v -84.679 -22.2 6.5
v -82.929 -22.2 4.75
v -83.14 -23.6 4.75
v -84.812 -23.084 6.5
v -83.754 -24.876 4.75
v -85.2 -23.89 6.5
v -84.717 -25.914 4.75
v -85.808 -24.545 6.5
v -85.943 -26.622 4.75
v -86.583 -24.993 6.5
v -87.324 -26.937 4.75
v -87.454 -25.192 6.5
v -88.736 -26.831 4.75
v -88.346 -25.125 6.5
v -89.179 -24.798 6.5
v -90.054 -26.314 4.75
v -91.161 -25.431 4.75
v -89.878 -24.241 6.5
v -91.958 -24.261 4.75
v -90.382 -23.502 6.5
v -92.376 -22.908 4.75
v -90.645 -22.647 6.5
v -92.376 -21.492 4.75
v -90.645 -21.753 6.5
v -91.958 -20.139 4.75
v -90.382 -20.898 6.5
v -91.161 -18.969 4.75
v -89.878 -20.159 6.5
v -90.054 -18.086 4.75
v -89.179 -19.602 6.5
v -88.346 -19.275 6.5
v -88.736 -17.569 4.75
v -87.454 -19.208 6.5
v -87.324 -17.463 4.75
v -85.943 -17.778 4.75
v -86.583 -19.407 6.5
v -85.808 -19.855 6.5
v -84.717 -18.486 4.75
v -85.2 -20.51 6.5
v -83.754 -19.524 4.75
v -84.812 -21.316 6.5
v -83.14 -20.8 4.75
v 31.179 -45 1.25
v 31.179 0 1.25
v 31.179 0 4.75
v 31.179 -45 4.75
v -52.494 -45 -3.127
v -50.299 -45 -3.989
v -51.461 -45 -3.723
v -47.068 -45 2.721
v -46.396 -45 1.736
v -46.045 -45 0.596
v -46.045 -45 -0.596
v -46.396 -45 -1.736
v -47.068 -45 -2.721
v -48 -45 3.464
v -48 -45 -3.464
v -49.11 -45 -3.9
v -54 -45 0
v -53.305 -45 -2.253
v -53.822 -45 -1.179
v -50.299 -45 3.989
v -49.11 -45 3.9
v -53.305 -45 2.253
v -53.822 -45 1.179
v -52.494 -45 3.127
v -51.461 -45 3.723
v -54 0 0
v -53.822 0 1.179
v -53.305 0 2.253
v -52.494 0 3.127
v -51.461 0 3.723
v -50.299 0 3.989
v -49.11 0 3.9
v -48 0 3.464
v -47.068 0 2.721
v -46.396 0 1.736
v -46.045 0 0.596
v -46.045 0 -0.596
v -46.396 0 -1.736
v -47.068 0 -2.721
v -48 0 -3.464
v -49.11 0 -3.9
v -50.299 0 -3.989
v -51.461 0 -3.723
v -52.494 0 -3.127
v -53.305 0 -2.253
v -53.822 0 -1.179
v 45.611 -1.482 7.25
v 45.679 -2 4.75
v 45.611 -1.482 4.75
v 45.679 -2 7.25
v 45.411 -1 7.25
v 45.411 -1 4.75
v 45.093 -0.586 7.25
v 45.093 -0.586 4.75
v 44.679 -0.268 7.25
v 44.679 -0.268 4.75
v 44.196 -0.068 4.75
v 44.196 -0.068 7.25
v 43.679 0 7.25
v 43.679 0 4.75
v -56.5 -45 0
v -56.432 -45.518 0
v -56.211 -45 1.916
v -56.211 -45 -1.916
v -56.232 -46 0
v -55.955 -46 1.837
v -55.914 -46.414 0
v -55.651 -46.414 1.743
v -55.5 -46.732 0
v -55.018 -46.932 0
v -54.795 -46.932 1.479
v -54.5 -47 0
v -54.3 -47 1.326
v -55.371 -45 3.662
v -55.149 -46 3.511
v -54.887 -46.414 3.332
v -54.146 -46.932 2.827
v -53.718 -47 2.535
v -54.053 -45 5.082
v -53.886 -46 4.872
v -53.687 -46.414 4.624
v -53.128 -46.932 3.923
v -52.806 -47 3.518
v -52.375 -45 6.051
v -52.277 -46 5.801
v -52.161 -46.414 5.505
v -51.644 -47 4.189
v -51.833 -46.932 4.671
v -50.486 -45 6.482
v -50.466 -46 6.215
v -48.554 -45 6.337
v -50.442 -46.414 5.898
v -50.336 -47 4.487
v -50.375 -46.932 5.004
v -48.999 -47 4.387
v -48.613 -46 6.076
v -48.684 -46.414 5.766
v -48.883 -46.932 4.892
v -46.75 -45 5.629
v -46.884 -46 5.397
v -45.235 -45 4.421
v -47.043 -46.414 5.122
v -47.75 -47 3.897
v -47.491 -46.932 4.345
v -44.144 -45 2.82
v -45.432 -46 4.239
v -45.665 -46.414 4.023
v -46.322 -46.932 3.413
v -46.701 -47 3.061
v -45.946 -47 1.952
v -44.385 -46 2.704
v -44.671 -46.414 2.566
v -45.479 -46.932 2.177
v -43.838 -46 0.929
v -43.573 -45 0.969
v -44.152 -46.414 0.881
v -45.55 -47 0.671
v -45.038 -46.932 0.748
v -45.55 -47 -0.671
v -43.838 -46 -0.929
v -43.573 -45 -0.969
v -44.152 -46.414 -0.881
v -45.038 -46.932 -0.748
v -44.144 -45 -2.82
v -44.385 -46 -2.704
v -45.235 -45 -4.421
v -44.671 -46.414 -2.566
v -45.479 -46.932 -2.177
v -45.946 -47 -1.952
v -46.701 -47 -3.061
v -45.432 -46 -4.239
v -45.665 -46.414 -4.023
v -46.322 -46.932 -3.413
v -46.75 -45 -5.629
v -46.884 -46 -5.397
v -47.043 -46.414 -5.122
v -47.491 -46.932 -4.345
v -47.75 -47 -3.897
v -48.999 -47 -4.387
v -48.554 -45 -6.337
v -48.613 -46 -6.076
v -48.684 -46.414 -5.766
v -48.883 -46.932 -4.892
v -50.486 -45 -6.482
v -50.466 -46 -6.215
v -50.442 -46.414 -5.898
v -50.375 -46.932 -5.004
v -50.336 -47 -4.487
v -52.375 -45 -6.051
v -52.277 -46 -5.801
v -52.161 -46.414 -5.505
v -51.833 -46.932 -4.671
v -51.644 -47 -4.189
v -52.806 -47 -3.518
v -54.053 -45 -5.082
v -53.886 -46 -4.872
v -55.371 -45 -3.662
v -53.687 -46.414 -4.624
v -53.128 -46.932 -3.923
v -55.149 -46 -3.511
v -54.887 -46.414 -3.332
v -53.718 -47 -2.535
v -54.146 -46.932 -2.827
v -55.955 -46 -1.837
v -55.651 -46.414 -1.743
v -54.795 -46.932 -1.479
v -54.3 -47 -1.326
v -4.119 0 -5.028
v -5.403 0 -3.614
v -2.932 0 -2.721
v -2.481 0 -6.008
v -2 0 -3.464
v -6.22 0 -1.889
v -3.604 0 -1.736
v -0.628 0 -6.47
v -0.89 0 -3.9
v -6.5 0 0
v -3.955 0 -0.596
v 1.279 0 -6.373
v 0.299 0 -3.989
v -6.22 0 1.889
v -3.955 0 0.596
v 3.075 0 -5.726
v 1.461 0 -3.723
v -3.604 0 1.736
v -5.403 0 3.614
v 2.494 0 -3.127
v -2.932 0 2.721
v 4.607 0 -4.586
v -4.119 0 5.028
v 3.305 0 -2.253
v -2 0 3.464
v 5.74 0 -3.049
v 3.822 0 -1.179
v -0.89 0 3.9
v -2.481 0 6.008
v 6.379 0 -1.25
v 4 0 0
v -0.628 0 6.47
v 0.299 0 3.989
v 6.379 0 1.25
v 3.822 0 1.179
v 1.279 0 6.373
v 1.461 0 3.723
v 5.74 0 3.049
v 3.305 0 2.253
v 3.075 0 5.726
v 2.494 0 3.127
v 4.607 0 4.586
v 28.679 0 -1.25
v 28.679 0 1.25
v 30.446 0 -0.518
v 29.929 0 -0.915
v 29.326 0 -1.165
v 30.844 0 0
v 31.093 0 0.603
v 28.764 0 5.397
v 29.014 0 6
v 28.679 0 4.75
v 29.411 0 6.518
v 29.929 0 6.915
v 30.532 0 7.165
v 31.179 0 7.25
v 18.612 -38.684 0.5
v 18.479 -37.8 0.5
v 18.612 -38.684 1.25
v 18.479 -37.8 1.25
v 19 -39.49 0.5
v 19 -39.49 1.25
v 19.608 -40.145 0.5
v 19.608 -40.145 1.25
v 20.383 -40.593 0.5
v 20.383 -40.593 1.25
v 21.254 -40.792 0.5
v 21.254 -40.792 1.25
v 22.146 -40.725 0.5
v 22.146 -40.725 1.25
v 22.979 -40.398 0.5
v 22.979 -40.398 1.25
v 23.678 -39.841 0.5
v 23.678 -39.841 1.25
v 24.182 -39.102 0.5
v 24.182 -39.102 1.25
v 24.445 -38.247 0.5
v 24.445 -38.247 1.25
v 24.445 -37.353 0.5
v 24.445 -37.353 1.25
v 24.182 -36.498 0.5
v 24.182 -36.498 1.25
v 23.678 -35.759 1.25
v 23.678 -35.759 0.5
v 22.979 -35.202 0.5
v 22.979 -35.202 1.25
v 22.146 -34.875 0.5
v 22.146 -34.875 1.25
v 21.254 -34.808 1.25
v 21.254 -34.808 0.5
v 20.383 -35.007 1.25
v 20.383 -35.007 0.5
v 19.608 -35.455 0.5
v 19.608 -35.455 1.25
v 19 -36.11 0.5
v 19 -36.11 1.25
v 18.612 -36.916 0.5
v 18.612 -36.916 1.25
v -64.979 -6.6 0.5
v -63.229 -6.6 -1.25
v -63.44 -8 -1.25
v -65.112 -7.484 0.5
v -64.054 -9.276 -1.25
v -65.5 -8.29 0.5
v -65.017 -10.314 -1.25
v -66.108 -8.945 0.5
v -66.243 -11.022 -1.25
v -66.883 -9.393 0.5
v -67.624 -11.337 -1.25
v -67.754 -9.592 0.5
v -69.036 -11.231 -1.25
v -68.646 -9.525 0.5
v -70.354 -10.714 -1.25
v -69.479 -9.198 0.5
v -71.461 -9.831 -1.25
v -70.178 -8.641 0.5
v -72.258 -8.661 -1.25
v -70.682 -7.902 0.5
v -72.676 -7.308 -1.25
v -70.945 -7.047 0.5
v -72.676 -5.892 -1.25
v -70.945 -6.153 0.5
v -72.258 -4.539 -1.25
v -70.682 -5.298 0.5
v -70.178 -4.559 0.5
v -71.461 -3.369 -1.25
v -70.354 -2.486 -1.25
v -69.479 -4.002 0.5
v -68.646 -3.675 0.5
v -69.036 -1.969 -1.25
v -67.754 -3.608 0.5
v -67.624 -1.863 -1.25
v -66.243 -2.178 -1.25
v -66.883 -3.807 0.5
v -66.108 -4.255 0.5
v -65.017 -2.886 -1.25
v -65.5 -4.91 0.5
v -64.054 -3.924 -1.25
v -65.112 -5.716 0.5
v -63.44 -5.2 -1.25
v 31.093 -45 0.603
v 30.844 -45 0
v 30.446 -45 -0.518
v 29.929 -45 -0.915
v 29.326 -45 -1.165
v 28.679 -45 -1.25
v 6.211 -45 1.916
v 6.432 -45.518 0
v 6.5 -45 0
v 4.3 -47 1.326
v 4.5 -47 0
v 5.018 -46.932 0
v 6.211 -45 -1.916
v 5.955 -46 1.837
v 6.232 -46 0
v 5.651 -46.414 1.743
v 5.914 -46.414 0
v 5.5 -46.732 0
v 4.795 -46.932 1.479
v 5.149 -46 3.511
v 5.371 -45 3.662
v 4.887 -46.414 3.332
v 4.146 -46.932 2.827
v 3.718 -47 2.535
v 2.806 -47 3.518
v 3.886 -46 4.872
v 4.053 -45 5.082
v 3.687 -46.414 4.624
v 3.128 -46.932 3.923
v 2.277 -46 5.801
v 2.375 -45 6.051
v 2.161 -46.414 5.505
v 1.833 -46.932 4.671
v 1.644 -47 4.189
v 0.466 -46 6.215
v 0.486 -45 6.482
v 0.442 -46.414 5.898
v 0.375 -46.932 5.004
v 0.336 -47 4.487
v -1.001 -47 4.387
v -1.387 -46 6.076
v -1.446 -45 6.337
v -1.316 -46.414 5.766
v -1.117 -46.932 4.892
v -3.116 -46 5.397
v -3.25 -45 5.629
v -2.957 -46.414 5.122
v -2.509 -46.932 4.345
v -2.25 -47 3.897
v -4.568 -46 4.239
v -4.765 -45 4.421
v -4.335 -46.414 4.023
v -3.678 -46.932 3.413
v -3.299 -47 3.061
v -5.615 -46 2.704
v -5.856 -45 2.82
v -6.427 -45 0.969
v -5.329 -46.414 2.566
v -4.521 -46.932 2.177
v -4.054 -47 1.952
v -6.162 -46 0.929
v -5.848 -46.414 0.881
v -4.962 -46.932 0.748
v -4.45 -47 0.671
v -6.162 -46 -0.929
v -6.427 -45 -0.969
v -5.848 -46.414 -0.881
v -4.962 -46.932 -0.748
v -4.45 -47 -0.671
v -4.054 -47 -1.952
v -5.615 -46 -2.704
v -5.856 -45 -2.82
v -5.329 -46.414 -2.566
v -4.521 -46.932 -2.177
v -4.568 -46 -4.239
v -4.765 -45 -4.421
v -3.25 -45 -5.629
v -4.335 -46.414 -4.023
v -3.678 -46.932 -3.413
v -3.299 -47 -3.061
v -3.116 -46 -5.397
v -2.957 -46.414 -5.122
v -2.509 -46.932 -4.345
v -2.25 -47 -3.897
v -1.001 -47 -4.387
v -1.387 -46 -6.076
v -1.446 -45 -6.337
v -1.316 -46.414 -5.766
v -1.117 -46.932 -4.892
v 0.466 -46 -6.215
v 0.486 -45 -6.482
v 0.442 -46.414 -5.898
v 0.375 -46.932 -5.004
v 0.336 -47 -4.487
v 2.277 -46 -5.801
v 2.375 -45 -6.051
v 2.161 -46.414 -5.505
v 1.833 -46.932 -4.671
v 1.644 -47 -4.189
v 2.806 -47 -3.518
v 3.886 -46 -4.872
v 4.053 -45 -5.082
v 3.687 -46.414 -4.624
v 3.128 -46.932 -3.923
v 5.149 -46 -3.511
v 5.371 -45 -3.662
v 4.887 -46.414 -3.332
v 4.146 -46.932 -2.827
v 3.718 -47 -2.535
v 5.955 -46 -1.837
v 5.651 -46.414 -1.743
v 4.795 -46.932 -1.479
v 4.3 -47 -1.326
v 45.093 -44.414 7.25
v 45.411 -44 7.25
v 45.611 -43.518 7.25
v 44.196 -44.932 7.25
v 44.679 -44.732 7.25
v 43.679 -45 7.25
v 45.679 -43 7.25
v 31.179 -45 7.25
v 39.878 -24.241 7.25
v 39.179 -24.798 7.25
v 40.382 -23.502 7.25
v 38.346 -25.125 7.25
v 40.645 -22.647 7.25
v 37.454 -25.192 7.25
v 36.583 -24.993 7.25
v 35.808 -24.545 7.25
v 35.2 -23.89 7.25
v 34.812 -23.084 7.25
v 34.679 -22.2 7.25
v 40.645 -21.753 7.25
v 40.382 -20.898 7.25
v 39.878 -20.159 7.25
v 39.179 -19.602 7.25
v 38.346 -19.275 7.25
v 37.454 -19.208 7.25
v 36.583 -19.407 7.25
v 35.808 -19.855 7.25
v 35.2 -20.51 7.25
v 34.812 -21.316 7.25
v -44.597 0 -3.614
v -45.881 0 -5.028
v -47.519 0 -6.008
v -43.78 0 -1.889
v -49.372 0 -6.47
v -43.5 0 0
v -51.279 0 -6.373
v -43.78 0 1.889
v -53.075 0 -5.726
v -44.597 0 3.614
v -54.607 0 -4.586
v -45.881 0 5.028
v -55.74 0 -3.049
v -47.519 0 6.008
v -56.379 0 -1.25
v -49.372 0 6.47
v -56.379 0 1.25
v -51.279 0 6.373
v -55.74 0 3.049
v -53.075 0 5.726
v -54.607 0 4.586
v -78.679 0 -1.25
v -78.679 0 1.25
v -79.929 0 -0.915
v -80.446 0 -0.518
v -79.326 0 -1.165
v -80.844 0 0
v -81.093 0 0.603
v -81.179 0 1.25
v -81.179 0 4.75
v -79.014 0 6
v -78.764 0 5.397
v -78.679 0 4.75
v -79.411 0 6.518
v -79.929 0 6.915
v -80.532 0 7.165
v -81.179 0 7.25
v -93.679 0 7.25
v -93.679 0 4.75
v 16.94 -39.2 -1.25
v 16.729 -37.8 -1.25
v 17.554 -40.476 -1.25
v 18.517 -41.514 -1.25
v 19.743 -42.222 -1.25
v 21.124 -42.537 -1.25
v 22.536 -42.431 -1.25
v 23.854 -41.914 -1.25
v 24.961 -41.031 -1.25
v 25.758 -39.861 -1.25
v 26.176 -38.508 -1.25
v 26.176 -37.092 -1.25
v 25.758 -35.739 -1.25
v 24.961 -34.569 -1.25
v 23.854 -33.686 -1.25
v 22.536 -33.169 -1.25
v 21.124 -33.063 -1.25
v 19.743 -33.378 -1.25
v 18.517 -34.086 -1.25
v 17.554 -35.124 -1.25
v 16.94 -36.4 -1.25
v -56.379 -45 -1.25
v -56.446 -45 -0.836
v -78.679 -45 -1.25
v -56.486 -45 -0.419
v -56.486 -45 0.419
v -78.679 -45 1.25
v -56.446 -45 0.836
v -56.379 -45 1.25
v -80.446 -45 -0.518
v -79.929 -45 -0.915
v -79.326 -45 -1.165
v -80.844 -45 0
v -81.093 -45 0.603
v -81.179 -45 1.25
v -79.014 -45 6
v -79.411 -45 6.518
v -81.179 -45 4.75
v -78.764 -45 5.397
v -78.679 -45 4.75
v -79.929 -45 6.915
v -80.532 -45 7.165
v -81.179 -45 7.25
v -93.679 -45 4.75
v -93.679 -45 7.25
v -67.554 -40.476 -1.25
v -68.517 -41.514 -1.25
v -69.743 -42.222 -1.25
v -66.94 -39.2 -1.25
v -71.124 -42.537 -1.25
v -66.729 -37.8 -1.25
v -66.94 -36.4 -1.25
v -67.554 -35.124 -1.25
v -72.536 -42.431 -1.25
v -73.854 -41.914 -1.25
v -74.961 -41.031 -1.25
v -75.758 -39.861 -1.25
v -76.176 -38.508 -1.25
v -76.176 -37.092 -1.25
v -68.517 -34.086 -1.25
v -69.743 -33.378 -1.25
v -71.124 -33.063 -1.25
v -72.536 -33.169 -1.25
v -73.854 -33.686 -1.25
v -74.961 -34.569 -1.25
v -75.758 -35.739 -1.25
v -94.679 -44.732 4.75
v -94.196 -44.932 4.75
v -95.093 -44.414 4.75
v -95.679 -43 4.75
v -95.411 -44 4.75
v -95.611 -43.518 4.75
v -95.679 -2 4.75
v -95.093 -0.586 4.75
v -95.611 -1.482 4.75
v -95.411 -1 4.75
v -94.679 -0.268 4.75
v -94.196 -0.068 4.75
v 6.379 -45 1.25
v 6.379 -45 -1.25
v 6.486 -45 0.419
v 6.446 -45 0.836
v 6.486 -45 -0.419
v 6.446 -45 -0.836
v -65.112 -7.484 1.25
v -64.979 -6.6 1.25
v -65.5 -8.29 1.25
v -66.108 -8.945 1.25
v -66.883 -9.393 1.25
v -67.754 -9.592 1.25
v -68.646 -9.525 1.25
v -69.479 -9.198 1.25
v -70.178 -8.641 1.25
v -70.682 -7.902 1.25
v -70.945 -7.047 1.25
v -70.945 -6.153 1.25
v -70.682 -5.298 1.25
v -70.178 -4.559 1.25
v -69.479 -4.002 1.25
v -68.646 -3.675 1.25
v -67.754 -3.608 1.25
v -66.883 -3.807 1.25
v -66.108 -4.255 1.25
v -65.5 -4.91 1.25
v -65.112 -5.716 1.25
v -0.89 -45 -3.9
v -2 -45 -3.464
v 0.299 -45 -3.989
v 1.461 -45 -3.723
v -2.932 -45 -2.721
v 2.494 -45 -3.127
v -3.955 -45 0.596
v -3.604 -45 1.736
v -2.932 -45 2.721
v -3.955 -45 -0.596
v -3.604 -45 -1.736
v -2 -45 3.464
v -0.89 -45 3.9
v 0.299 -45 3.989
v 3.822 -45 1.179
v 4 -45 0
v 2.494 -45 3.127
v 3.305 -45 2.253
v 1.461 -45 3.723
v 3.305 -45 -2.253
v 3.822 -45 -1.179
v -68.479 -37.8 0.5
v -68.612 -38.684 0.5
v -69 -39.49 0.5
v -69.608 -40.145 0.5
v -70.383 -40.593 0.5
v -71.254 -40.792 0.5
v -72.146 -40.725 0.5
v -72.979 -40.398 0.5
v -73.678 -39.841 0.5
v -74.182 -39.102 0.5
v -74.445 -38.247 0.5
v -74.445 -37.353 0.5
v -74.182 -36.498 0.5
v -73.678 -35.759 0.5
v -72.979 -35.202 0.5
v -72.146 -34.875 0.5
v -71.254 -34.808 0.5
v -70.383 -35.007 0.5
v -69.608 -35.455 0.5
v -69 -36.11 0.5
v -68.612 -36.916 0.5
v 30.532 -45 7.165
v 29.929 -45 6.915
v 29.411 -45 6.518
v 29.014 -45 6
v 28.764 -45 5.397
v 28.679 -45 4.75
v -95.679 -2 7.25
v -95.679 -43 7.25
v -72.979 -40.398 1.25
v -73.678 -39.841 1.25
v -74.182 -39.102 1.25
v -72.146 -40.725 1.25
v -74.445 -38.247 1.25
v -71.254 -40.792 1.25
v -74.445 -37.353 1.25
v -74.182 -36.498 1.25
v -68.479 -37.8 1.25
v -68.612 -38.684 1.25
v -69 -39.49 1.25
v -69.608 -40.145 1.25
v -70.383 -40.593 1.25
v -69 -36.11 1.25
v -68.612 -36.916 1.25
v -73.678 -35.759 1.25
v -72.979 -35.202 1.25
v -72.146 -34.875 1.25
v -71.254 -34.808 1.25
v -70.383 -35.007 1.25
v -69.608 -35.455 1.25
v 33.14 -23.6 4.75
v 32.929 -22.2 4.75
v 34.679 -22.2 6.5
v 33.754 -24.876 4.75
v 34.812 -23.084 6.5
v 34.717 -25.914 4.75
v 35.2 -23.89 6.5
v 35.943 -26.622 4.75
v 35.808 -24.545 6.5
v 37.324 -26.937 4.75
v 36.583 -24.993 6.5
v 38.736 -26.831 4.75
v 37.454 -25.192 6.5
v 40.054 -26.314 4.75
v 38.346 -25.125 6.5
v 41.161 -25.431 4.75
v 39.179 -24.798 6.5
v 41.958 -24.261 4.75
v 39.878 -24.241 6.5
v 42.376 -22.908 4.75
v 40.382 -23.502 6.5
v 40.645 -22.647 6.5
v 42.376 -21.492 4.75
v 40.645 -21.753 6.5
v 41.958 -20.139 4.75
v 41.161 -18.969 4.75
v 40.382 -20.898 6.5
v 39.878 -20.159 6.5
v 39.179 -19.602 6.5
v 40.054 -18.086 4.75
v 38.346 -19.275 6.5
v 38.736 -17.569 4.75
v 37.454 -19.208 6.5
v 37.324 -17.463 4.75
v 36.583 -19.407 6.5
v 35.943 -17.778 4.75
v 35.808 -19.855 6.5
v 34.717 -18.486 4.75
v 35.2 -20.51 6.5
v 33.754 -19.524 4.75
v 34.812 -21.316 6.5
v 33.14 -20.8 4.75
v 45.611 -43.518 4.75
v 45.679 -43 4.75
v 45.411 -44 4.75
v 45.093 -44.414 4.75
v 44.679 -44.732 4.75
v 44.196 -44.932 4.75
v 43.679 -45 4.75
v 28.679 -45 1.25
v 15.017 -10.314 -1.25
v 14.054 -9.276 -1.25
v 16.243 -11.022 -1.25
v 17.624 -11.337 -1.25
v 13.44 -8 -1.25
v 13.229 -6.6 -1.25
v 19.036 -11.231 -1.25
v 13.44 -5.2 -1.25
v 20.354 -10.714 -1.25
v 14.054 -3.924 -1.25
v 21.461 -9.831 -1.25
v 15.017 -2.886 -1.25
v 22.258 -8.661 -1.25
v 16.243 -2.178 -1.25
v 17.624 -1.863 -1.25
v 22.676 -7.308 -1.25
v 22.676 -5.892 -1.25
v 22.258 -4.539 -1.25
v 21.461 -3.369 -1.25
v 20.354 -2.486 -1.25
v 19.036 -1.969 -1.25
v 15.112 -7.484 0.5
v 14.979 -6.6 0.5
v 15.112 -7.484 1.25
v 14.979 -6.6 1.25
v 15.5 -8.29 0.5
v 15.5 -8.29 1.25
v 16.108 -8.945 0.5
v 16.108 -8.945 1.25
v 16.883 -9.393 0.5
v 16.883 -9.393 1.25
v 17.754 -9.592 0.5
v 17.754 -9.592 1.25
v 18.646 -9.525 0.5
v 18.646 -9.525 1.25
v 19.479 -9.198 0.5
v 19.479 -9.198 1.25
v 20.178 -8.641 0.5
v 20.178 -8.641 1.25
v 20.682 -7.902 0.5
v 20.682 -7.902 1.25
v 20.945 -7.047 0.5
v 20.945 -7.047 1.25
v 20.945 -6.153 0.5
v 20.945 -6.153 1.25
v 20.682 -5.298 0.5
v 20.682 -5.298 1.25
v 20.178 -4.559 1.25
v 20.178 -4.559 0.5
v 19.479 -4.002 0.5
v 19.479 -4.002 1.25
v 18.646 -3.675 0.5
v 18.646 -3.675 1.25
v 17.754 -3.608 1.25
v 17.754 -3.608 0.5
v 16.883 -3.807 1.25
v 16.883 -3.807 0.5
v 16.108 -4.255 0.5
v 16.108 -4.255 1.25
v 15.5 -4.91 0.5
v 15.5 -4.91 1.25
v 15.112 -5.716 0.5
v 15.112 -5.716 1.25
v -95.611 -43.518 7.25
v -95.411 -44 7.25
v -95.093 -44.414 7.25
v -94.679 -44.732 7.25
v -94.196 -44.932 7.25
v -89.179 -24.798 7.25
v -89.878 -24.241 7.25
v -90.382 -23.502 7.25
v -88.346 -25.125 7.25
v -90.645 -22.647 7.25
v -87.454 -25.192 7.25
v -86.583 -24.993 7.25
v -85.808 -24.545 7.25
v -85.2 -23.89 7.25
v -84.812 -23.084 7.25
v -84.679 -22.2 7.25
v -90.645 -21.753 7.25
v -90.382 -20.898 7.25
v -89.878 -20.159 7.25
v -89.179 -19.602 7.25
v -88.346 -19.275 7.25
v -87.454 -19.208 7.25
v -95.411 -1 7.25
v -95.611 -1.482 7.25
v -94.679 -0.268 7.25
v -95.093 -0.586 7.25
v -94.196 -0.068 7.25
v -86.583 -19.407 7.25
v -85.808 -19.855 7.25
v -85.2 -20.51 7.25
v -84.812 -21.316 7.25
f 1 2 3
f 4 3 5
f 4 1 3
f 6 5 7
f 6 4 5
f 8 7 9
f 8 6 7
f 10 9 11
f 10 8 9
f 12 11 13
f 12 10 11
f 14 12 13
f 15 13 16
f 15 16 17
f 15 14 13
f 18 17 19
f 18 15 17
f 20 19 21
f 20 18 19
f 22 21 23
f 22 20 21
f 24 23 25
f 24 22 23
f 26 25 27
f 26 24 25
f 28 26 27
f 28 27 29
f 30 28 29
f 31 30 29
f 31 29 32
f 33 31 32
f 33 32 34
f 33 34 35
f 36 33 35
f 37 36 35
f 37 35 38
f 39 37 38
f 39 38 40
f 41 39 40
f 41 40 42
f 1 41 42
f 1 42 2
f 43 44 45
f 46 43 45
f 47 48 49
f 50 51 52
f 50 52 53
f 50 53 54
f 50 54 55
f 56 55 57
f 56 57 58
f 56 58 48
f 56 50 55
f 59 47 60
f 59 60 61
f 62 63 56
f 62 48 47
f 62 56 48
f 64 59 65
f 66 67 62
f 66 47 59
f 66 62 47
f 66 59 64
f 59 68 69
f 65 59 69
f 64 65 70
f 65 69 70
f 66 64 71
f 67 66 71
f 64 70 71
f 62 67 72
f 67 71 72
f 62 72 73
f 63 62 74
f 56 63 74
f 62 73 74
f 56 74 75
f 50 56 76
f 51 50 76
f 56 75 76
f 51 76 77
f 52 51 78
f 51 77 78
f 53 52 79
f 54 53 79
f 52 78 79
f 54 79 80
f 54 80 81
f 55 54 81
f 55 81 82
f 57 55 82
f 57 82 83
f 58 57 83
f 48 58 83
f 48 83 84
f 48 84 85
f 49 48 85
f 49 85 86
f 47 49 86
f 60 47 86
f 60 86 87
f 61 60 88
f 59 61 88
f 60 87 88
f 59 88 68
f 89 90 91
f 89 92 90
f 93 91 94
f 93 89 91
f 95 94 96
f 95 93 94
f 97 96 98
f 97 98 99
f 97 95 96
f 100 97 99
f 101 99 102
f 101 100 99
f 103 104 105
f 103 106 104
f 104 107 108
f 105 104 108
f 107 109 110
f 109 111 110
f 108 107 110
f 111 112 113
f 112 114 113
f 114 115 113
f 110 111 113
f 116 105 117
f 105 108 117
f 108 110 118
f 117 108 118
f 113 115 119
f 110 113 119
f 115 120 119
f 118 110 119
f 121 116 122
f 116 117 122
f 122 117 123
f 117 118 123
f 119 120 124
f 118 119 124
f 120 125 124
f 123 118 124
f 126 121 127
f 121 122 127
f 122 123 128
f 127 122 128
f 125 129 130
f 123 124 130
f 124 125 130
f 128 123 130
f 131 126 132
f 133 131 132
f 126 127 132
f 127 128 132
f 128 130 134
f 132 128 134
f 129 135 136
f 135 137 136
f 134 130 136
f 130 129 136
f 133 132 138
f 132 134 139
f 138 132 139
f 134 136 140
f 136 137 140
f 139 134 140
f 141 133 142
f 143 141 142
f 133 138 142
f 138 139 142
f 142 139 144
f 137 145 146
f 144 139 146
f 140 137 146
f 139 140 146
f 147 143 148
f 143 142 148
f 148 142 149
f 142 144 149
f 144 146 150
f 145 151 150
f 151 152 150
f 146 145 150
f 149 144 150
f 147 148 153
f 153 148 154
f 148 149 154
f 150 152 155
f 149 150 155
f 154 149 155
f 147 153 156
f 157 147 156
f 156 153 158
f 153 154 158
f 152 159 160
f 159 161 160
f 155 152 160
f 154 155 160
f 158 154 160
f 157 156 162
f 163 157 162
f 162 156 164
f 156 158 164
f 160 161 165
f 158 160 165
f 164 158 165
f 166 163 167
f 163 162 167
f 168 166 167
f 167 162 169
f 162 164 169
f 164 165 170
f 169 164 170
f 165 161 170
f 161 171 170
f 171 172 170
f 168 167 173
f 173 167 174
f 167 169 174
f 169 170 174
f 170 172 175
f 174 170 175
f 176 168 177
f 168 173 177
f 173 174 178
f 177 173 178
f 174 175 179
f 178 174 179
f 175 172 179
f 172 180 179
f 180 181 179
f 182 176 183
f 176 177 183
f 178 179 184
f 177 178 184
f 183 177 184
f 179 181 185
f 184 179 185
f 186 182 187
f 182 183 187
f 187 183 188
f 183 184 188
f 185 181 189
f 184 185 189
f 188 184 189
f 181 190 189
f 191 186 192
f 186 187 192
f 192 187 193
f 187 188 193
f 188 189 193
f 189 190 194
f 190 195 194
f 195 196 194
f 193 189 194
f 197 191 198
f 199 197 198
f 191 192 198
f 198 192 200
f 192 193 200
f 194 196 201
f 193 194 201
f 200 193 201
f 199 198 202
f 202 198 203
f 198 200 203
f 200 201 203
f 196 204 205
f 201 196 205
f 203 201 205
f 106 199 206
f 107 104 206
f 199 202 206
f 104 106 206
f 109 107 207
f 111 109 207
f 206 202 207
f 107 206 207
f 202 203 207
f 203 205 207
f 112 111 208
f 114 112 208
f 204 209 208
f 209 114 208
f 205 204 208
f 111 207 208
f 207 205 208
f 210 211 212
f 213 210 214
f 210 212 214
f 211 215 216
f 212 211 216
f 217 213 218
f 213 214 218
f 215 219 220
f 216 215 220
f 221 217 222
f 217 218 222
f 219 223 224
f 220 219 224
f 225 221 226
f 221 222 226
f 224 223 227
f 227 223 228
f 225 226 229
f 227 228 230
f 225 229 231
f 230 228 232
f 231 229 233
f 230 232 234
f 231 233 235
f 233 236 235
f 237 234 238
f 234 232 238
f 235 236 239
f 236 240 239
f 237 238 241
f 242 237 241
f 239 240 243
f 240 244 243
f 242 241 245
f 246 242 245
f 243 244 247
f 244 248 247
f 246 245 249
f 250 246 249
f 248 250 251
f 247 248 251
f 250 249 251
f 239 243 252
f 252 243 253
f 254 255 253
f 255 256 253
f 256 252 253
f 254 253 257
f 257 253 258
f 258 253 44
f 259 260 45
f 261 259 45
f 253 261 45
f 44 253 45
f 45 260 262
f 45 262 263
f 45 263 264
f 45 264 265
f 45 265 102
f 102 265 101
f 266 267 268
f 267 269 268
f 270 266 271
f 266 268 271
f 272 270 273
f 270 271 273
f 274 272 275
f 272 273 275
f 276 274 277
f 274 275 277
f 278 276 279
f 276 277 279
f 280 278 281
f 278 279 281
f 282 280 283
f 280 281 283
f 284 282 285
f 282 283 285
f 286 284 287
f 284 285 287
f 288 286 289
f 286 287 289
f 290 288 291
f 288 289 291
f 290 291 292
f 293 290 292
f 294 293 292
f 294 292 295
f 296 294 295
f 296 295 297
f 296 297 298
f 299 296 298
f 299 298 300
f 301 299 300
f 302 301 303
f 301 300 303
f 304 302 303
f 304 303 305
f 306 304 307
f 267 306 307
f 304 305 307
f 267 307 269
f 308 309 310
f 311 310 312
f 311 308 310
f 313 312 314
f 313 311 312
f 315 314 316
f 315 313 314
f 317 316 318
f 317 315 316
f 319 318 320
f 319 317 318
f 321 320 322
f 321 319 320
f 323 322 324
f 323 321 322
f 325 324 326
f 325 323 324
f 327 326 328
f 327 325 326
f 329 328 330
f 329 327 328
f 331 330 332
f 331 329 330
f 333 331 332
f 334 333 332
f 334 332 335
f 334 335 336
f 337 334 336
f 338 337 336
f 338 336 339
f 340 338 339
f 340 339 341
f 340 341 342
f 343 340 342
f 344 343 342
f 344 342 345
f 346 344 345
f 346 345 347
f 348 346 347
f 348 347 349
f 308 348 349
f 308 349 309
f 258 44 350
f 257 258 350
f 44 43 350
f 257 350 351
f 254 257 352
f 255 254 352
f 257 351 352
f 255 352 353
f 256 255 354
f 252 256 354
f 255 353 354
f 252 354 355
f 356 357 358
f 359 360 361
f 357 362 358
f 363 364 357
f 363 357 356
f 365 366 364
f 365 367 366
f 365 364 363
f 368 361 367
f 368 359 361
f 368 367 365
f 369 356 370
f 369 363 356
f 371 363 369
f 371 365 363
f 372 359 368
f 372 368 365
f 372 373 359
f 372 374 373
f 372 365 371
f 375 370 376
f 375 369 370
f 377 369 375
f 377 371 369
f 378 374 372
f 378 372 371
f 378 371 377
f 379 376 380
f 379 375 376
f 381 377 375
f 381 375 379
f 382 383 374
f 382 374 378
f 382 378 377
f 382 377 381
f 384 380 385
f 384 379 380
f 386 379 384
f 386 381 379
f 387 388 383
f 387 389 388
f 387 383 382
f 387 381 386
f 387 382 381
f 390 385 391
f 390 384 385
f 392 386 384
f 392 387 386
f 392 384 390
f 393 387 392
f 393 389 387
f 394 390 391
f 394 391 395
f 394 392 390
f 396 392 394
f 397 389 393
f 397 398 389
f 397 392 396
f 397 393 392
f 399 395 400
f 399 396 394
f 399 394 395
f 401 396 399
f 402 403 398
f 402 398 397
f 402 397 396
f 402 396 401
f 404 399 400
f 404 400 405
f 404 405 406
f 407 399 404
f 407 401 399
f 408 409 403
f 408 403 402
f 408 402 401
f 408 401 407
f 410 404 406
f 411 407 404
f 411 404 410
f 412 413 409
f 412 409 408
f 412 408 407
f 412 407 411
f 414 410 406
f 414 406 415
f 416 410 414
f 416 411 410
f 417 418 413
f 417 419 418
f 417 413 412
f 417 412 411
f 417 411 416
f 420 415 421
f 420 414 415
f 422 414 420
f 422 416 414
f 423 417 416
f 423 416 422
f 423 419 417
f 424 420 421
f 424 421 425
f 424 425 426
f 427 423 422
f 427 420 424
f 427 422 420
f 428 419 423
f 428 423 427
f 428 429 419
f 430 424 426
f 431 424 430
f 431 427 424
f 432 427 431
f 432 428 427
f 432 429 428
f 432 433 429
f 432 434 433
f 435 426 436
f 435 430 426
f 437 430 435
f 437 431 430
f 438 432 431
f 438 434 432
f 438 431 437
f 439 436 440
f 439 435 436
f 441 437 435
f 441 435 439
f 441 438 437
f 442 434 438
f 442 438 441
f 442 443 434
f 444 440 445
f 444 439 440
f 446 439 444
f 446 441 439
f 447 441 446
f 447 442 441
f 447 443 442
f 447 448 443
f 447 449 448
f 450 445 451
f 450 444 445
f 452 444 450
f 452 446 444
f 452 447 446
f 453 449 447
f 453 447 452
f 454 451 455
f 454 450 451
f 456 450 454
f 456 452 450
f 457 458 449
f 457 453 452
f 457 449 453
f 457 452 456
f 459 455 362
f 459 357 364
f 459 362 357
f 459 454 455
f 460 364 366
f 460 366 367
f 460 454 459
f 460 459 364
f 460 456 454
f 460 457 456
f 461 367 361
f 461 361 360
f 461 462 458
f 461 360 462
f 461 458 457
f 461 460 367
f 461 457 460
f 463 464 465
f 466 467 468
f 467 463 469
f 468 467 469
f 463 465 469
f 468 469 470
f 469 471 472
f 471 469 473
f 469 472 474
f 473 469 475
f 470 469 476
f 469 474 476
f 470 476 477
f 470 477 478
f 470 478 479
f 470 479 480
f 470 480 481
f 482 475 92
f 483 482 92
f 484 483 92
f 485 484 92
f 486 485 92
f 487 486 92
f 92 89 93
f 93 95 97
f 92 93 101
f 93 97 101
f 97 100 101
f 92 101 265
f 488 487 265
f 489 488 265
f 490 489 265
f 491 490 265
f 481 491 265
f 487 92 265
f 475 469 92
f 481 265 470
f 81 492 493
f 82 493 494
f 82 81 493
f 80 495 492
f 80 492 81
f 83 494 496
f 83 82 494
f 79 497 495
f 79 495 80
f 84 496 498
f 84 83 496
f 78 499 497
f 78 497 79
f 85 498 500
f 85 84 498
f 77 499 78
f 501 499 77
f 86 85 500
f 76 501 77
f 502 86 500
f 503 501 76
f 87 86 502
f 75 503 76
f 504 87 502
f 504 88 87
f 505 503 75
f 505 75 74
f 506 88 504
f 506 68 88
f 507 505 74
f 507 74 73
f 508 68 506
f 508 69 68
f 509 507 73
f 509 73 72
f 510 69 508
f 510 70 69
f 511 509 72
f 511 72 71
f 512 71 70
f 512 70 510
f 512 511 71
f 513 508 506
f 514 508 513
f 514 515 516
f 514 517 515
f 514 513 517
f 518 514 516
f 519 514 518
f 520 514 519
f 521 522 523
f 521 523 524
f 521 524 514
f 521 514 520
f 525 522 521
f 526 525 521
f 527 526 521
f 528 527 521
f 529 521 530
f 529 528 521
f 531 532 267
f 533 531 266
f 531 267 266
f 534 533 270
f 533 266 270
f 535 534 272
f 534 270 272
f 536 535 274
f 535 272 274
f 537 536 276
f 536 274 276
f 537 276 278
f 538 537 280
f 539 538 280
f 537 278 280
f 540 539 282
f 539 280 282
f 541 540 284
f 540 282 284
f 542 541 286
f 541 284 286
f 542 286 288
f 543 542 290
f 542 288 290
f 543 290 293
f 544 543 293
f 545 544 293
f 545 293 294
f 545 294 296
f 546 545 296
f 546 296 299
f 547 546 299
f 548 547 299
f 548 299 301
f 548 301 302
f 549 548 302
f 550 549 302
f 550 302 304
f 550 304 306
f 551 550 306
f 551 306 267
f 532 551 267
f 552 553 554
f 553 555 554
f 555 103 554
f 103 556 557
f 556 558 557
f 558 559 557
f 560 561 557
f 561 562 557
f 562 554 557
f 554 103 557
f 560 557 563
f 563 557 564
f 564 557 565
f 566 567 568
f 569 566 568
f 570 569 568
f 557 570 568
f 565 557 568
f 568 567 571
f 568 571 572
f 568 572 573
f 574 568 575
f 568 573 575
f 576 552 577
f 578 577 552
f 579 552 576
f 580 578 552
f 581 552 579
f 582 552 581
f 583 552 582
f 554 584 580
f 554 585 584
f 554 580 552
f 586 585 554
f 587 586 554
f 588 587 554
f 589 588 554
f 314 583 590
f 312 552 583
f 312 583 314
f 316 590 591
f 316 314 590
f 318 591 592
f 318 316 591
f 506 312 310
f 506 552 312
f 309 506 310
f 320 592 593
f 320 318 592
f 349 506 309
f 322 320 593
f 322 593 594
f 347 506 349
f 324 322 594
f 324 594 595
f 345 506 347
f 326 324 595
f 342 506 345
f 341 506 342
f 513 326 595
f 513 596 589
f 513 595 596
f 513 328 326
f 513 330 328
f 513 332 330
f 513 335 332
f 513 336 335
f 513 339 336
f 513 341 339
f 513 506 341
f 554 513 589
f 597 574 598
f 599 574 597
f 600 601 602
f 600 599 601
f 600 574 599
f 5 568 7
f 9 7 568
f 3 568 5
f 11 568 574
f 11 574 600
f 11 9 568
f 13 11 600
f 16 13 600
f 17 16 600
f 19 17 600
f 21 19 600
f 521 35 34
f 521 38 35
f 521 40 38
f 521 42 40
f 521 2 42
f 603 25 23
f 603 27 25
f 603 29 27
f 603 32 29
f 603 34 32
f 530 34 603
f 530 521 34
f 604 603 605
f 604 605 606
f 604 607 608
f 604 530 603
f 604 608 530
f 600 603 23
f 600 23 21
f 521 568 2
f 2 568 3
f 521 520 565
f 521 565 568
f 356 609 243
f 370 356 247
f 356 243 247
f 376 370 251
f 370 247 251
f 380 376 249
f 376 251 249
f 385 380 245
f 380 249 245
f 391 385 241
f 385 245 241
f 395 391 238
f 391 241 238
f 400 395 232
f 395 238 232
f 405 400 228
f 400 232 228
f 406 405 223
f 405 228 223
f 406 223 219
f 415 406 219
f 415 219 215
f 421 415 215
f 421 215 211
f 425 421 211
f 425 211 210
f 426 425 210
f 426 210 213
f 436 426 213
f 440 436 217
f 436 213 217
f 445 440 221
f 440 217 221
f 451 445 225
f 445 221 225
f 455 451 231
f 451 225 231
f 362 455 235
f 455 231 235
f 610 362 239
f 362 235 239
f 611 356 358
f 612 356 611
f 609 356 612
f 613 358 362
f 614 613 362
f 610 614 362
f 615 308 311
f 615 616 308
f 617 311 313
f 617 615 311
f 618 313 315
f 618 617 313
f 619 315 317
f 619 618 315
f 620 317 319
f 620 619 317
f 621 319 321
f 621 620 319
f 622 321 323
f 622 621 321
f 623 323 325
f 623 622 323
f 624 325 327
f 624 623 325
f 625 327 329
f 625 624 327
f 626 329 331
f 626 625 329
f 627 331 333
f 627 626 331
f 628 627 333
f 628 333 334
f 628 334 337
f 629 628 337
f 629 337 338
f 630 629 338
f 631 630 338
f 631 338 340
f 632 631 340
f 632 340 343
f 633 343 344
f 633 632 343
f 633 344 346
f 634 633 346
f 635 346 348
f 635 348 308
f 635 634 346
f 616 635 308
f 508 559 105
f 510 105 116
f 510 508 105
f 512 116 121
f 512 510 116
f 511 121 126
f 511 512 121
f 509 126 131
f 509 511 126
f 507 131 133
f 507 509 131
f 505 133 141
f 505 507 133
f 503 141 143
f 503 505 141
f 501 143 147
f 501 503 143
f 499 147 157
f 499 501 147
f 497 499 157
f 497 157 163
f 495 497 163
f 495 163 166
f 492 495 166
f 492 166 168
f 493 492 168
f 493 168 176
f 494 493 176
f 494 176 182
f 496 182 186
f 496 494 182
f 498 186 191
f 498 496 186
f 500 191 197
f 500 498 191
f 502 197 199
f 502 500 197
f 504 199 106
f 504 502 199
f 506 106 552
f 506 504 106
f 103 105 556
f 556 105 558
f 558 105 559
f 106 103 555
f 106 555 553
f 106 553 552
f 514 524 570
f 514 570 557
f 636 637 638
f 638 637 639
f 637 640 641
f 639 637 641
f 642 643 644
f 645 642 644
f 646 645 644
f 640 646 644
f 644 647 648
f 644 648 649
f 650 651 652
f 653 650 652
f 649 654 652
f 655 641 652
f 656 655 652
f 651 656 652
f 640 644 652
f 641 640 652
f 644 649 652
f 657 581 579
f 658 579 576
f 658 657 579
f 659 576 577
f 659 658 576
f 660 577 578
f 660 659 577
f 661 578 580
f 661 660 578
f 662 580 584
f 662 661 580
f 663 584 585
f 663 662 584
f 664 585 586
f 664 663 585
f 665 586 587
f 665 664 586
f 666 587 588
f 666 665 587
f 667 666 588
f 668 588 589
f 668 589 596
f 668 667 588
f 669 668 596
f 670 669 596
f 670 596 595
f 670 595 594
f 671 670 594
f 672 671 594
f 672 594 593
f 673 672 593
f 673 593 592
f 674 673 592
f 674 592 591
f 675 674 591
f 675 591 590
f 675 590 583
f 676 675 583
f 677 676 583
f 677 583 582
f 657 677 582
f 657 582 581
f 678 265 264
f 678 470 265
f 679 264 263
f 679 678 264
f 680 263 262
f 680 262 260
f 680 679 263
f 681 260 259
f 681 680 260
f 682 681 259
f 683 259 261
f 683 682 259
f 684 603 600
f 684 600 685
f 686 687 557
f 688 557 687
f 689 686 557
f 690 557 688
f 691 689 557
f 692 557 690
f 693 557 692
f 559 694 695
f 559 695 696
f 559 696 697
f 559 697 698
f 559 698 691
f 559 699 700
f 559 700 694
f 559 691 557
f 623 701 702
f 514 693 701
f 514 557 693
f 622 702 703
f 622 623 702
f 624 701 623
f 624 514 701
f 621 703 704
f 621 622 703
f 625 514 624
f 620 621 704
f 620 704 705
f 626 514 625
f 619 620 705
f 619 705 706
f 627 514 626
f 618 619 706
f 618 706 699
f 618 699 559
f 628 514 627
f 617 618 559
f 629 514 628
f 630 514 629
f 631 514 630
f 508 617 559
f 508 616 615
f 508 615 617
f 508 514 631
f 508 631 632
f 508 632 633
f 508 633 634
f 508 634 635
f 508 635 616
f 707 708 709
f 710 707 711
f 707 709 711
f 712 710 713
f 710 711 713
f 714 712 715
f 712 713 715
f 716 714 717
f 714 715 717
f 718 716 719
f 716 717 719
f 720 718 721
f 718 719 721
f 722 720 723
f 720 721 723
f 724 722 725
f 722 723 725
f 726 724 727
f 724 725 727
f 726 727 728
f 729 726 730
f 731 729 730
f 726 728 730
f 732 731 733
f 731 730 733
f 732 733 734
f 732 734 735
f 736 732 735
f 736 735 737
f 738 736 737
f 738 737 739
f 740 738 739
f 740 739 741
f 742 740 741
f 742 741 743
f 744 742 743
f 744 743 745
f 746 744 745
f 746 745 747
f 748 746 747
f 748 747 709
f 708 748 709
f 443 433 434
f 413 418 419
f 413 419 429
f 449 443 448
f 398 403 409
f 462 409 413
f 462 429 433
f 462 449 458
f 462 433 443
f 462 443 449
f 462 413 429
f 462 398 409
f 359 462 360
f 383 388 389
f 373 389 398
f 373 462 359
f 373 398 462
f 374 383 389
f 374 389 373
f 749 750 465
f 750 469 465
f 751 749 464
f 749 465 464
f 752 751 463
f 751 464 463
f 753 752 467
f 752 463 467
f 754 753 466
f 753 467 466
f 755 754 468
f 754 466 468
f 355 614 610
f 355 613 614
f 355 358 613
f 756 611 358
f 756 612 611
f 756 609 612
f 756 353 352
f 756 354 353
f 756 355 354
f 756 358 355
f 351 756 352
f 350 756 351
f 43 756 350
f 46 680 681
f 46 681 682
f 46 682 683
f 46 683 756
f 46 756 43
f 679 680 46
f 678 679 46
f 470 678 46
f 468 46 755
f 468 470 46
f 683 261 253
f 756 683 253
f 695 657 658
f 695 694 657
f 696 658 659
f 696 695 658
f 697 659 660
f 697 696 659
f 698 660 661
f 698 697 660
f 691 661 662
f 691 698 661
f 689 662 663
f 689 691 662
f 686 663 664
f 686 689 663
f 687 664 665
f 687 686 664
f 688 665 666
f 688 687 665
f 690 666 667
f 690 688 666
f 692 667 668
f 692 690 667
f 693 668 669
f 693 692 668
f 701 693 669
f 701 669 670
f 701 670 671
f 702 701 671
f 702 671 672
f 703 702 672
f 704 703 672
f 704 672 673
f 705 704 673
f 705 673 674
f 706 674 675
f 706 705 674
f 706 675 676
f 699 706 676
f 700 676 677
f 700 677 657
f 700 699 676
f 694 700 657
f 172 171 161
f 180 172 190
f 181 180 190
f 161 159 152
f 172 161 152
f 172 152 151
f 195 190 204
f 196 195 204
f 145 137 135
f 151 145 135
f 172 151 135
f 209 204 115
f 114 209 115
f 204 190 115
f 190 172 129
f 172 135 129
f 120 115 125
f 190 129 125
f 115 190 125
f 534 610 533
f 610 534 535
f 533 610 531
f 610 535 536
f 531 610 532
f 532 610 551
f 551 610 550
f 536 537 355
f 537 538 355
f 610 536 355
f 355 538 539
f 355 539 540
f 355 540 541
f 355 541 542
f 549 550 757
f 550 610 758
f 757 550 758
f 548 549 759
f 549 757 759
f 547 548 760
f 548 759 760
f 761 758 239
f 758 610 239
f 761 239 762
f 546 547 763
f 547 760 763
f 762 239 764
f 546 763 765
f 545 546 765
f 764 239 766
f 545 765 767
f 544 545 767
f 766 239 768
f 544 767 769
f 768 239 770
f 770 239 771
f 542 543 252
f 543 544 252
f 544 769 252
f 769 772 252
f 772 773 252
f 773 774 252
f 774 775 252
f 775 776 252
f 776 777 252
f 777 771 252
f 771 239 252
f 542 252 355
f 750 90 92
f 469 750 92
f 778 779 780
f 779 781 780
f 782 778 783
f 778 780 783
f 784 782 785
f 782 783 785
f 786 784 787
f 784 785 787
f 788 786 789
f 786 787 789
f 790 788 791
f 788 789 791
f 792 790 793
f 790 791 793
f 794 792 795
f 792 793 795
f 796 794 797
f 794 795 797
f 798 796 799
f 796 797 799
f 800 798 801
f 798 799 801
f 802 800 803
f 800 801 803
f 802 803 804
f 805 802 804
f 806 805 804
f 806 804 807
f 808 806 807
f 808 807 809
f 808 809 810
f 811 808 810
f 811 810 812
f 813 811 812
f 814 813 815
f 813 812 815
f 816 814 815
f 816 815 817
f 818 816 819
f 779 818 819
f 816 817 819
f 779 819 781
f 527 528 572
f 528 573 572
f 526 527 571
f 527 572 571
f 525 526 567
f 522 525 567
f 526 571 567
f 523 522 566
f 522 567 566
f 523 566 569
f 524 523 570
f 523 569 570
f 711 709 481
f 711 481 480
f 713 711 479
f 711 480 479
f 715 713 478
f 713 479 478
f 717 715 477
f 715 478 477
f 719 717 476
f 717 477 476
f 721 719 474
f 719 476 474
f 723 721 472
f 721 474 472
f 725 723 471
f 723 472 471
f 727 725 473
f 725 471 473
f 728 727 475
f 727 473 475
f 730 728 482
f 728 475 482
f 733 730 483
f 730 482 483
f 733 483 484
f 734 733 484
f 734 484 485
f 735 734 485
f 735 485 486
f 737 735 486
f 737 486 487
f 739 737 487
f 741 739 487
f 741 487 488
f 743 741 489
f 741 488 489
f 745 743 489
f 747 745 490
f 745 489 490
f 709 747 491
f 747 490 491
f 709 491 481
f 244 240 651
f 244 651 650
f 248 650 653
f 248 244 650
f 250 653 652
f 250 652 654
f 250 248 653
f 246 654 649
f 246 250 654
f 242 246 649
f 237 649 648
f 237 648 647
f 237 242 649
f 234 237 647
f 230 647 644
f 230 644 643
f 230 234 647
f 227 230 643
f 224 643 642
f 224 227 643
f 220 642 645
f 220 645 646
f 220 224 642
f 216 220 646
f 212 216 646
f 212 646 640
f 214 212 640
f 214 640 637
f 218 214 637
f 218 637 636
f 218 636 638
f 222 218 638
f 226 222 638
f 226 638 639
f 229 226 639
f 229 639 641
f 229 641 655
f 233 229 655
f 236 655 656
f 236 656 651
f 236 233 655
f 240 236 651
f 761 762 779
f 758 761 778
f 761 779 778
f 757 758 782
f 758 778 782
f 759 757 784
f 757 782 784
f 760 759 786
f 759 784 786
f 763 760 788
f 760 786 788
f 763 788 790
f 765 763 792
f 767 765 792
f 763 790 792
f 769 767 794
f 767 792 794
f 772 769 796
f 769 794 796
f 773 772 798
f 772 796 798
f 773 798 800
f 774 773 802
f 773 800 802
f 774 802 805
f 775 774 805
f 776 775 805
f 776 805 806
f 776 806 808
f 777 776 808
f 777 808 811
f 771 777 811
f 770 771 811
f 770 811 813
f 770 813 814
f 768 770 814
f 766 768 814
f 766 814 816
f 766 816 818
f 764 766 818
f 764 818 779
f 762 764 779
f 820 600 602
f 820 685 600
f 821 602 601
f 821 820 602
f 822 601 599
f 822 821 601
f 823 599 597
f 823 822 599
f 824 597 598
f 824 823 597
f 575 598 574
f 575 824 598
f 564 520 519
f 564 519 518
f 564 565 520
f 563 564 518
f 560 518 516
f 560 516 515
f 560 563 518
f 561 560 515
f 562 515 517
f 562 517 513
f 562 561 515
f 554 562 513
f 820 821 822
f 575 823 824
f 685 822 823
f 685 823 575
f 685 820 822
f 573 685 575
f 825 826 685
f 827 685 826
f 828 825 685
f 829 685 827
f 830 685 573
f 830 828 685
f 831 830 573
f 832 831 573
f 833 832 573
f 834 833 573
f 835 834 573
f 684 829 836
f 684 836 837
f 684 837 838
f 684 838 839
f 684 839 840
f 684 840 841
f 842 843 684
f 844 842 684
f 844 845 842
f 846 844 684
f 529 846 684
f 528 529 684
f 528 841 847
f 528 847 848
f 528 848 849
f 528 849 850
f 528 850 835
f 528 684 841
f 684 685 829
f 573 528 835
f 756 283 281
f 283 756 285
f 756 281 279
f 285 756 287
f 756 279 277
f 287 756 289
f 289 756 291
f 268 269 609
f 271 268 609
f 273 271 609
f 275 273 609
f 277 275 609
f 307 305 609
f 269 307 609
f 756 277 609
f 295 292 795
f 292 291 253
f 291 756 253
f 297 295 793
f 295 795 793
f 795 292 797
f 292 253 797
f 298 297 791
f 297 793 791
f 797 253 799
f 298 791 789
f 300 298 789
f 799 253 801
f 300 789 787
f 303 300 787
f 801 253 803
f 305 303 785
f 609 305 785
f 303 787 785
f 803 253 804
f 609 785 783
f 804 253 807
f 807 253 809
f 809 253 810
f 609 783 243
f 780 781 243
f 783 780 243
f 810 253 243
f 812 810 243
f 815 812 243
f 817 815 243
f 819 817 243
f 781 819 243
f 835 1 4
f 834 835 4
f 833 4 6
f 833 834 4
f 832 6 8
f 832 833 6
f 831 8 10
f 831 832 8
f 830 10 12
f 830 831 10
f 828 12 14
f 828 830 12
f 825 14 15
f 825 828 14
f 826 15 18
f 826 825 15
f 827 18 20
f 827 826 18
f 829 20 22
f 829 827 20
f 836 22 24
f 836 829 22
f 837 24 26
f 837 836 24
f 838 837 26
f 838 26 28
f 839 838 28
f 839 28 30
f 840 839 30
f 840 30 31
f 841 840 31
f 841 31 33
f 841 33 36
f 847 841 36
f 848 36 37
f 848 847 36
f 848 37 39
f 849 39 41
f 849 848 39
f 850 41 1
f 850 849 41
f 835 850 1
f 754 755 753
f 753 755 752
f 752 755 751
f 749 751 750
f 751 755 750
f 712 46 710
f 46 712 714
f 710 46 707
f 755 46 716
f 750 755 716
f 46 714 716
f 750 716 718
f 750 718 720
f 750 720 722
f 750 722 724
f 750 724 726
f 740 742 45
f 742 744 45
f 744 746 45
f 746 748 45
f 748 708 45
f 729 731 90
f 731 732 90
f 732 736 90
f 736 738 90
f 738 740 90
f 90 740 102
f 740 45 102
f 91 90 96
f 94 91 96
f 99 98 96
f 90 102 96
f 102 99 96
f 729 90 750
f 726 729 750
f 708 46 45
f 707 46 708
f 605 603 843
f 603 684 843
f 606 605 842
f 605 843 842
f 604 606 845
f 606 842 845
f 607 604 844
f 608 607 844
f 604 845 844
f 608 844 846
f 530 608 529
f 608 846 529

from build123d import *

# Parameters (mm, degrees)
F0_R            = 4
F1_DEPTH        = 45
F2_R            = 2
F3_R            = 2.5
F5_D            = 6
F5_CSINK_D      = 9.5
F5_CSINK_ANGLE  = 90
F6_R            = 6.5
F7_DEPTH        = 2
F8_R            = 1.99999
F10_D           = 6
F10_CSINK_D     = 9.5
F10_CSINK_ANGLE = 90


# Not quite as in the source:
# - a fillet or chamfer is up to 0.001 mm smaller than in the source, because OpenCascade refuses the exact size
# - a feature names something its author has since deleted; it is built from what else it names


with BuildPart() as f1:
    # F0 (on Front) → F1 (new body)
    with BuildSketch(Plane.XZ):
        with BuildLine():
            Line((28.6786754111, 1.25), (6.3786754111, 1.25))
            ThreePointArc((6.3786754111, 1.25), (-6.5, 0), (6.3786754111, -1.25))
            Line((6.3786754111, -1.25), (31.1786754111, -1.25))
            Line((31.1786754111, -1.25), (31.1786754111, 4.75))
            Line((31.1786754111, 4.75), (45.6786754111, 4.75))
            Line((45.6786754111, 4.75), (45.6786754111, 7.25))
            Line((45.6786754111, 7.25), (28.6786754111, 7.25))
            Line((28.6786754111, 7.25), (28.6786754111, 1.25))
        make_face()
        Circle(F0_R, mode=Mode.SUBTRACT)
    extrude(amount=F1_DEPTH)

    # F2
    f2_edges = [f1.edges().sort_by_distance(p)[0] for p in [
        (45.678675, -45, 6),
        (45.678675, 0, 6),
    ]]
    fillet(f2_edges, radius=F2_R)

    # F3
    f3_edges = [f1.edges().sort_by_distance(p)[0] for p in [
        (31.178675, -22.5, -1.25),
        (28.678675, -22.5, 7.25),
    ]]
    fillet(f3_edges, radius=F3_R)

    # F5 (through all)
    with Locations(Plane(origin=(0, 0, -1.25), x_dir=(1, 0, 0), z_dir=(0, 0, -1))):
        with Locations((17.9786754111, 6.6), (21.4786754111, 37.8)):
            CounterSinkHole(F5_D / 2, F5_CSINK_D / 2, counter_sink_angle=F5_CSINK_ANGLE)

    # F6 (on face) → F7 (join)
    with BuildSketch(Plane.XZ.offset(45)):
        Circle(F6_R)
    extrude(amount=F7_DEPTH)

    # F8 (radius 2 in the source; OpenCascade refuses exactly that, so slightly less here)
    f8_edges = [f1.edges().sort_by_distance(p)[0] for p in [
        (-6.5, -47, 0),
    ]]
    fillet(f8_edges, radius=F8_R)

    # F10 (through all)
    with Locations(Plane(origin=(0, 0, 4.75), x_dir=(1, 0, 0), z_dir=(0, 0, -1))):
        with Locations((37.6786754111, 22.2)):
            CounterSinkHole(F10_D / 2, F10_CSINK_D / 2, counter_sink_angle=F10_CSINK_ANGLE)


with BuildPart() as f12_1:
    # F12: instance of F1
    add(f1.part.mirror(Plane.YZ.offset(-25)))


solid = Compound([f1.part, f12_1.part])
